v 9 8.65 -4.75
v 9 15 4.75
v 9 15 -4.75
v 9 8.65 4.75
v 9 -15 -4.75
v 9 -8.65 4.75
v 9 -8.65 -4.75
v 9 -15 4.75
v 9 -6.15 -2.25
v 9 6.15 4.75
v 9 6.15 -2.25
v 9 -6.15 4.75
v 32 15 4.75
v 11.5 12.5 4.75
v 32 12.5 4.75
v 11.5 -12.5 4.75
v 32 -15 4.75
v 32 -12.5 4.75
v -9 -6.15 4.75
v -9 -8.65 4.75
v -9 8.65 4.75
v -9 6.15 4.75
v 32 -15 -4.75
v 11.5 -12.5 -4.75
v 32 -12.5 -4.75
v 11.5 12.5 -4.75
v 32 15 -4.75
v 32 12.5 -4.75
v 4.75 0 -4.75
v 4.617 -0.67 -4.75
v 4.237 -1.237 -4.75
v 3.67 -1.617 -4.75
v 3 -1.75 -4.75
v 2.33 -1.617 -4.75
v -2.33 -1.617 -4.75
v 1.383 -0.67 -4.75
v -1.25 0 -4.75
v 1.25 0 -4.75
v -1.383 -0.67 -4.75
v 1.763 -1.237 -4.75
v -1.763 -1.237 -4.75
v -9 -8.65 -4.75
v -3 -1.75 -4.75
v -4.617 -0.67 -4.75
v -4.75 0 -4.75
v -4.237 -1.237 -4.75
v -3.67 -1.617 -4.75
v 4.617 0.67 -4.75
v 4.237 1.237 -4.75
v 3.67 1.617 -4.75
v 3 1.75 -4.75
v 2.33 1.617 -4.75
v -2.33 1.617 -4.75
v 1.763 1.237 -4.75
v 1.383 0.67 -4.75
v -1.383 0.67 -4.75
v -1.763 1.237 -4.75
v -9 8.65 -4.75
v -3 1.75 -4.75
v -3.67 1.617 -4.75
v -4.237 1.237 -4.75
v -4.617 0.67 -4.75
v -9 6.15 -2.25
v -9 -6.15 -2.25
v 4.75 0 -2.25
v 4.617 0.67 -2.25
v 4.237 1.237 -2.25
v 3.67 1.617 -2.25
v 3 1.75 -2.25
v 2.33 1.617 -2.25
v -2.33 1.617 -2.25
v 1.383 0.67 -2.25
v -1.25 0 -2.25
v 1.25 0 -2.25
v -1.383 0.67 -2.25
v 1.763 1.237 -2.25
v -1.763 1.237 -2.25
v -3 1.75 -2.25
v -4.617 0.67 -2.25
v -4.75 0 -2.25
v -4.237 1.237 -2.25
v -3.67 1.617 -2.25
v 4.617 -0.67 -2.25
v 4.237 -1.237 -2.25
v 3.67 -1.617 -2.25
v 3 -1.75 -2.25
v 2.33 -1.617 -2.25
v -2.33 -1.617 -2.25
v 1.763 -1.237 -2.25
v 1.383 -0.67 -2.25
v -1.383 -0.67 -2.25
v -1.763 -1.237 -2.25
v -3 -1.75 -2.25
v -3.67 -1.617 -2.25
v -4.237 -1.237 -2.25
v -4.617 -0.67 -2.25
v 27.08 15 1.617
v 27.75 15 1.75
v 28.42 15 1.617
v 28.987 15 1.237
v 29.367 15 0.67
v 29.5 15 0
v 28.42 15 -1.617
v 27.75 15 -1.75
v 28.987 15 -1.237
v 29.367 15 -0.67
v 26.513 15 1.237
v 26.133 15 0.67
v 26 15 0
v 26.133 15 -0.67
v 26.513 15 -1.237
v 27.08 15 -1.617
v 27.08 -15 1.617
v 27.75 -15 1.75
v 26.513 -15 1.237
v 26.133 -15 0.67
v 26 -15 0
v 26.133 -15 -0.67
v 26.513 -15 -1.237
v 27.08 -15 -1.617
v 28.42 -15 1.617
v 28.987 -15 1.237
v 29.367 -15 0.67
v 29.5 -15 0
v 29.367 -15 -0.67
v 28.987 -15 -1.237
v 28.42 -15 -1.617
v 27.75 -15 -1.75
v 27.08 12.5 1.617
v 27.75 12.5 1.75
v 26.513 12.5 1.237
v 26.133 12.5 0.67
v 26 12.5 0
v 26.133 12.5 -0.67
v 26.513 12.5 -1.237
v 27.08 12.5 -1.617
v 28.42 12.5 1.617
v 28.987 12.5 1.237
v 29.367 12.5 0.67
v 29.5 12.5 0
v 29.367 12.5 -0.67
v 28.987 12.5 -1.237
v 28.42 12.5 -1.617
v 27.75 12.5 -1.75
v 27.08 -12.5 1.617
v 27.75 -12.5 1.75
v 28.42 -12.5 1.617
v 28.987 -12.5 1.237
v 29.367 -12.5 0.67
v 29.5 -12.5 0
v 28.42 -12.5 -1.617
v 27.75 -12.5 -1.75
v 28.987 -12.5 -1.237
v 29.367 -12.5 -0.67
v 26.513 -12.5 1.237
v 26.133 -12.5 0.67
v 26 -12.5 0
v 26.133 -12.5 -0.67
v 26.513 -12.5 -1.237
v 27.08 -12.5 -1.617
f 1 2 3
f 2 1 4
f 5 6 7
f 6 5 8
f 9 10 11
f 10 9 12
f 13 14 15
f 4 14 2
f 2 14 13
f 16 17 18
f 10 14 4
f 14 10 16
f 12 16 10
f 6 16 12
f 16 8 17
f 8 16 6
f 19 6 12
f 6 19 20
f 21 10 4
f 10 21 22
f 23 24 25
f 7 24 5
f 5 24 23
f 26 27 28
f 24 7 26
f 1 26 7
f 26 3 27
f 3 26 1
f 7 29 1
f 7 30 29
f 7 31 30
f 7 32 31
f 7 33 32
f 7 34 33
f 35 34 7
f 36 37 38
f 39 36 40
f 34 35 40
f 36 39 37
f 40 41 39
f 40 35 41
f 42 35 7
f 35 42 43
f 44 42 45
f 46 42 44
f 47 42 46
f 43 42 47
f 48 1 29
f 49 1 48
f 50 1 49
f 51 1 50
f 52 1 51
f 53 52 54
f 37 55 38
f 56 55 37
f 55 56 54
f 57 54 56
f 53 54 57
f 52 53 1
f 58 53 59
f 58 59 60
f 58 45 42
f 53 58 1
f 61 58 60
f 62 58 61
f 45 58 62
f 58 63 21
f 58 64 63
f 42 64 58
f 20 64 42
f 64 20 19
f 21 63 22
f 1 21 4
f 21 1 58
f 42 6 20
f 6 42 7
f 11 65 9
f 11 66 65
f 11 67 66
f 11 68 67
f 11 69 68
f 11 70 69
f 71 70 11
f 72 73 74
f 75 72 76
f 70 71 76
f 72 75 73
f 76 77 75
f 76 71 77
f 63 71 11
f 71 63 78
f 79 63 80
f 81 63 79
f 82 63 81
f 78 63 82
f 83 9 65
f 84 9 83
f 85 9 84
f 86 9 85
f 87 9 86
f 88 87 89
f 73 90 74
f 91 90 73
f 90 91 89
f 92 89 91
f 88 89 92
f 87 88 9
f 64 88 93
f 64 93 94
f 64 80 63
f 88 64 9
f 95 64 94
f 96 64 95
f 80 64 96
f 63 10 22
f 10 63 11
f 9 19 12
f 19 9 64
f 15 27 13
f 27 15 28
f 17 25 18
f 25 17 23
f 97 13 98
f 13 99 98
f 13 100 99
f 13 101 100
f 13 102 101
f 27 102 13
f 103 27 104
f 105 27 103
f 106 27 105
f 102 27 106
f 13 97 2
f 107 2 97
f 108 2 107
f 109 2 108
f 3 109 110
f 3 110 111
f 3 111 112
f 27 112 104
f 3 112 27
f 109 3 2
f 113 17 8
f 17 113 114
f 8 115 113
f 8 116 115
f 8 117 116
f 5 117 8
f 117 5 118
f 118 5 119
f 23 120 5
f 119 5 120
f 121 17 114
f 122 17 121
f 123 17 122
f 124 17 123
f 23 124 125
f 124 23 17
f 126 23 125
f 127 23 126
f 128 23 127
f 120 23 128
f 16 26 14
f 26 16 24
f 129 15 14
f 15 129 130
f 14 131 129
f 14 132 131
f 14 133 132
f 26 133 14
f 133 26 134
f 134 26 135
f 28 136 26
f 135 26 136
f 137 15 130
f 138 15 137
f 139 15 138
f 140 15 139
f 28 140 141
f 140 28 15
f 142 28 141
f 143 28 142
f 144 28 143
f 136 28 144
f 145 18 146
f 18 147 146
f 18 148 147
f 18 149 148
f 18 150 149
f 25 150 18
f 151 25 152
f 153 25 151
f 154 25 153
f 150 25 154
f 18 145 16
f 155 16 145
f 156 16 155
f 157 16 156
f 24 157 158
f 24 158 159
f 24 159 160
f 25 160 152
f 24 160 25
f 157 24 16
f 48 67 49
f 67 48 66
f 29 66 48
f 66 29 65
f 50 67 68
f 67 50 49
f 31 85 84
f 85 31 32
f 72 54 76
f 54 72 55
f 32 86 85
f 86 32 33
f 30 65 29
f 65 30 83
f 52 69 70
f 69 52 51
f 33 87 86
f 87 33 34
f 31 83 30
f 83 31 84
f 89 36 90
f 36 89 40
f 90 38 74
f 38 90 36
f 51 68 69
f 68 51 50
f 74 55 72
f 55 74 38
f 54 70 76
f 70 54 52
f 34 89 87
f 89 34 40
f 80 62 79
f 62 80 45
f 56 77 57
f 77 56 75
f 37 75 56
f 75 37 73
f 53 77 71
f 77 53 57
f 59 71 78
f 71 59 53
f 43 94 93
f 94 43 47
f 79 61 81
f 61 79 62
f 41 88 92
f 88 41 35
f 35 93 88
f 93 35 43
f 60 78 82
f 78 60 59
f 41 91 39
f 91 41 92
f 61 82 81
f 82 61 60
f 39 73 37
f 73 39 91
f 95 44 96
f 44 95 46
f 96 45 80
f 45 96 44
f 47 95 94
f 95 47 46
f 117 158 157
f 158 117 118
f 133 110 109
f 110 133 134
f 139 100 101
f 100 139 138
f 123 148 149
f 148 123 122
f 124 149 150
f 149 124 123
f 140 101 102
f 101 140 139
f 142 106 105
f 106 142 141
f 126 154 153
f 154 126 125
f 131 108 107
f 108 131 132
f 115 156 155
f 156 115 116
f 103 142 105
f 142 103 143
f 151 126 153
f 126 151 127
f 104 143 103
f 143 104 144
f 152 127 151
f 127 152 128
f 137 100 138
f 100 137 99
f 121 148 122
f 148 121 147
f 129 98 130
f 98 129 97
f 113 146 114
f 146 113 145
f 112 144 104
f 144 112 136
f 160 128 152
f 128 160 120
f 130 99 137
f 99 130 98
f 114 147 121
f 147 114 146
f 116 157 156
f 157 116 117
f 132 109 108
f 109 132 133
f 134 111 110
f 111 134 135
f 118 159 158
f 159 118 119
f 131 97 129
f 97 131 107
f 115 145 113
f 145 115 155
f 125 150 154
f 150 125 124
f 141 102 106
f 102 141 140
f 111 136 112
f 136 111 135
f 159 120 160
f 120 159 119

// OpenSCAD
width_in_studs  = 1;
teeth=48;
length= 170;
brick_height=7;
pocketZ=3.5;
screw_dia=3.5;
screw_posX=165;
screw_dist=6;

filz_mountX=18;
filz_dia=24;
filz_width=25;

  
  brick_width         = 12;
  stud_diameter       = 4.88;
 
  tooth_base_width    = 2.3;
  tooth_tip_width     = 0.87;
  tooth_height        = 2.06;
  tooth_top           = 5.79;
  tooth_tip_radius    = 0.15;
  teeth_per_brick     = 3.1;
  half_pegs_per_brick = 2;
  gap_width           = 0.884;



module tooth() {
  $fn = 20;
  

  //render()
  x_a = -((tooth_tip_width/2) - tooth_tip_radius);
  x_b = (tooth_tip_width/2) - tooth_tip_radius;
  translate([(gap_width+tooth_base_width)/2,0,-tooth_height+brick_height])
  rotate([0,0,180])
  translate([0,-(brick_width * width_in_studs)/2,tooth_height]) {
    difference() {
      hull() {
        translate([x_a,0,tooth_height]) rotate([90,0,0]) cylinder(r=tooth_tip_radius,   h=(brick_width * width_in_studs), center=true);
        translate([x_b,0,tooth_height]) rotate([90,0,0]) cylinder(r=tooth_tip_radius,   h=(brick_width * width_in_studs), center=true);
        translate([0,0,0])              rotate([90,0,0]) cylinder(r=tooth_base_width/2, h=(brick_width * width_in_studs), center=true);
      }
      translate([0,0,-1]) cube(size=[gap_width + tooth_base_width, brick_width * width_in_studs + 1, 1.9], center=true);
    }
  }
}

module rack() {
   wall_thickness      = 2;
difference(){
union(){
  tooth_width = tooth_base_width + gap_width;
  
 
  for ( i = [0 : teeth-1]) {
    translate([i * (tooth_base_width + gap_width), 0, 0]) tooth();
  }

  difference() {
    cube(size=[(length), (brick_width * width_in_studs), brick_height]);
    translate([wall_thickness,wall_thickness,0]) cube(size=[length - (wall_thickness*2), (brick_width * width_in_studs) - (wall_thickness*2), pocketZ]);
    // shave a bit off the beginning and end of the brick
    translate([-1.98,-1,0]) cube(size=[2, (brick_width * width_in_studs)+2, 10]);
    translate([length - 0.02,-1,0]) cube(size=[2,length+2, 10]);
  }

 }

translate([screw_posX,brick_width/2,0])cylinder(d=screw_dia, h=brick_height+1,$fn=16);
translate([screw_posX-screw_dist,brick_width/2,0])cylinder(d=screw_dia, h=brick_height+1,$fn=16);
}
}

module filz_mount(){
    wall_thickness      = 2.5;
    tolerance=0.3;
    height=brick_height+wall_thickness;
    block_rackY=filz_dia/2+3*wall_thickness+screw_dia;
    block_filzX=filz_dia/2+3*wall_thickness+screw_dia;
    block_filzY=filz_width+2*wall_thickness;
difference(){    
union(){
difference(){
cube([filz_mountX,brick_width+2*wall_thickness+tolerance,height],center=true);
translate([0,0,wall_thickness])cube([filz_mountX,brick_width+tolerance,height],center=true);    
}
difference(){
translate([filz_mountX/2+ block_filzX/2,0,0])cube([block_filzX,block_filzY,brick_height+wall_thickness],center=true); 
translate([filz_mountX/2+ block_filzX/2+wall_thickness,0,0])cube([block_filzX,filz_width,brick_height+wall_thickness],center=true); 
    }
}
translate([screw_dist/2,0,0])cylinder(d=screw_dia, h=brick_height+wall_thickness+1,$fn=16,center=true);
translate([-screw_dist/2,0,0])cylinder(d=screw_dia, h=brick_height+wall_thickness+1,$fn=16,center=true);
translate([filz_mountX/2+block_filzX-screw_dia/2-wall_thickness,0,0])rotate([90,0,0])cylinder(d=screw_dia, h=filz_width+2*wall_thickness+1,$fn=16,center=true);
}
}

//rack();
filz_mount();
